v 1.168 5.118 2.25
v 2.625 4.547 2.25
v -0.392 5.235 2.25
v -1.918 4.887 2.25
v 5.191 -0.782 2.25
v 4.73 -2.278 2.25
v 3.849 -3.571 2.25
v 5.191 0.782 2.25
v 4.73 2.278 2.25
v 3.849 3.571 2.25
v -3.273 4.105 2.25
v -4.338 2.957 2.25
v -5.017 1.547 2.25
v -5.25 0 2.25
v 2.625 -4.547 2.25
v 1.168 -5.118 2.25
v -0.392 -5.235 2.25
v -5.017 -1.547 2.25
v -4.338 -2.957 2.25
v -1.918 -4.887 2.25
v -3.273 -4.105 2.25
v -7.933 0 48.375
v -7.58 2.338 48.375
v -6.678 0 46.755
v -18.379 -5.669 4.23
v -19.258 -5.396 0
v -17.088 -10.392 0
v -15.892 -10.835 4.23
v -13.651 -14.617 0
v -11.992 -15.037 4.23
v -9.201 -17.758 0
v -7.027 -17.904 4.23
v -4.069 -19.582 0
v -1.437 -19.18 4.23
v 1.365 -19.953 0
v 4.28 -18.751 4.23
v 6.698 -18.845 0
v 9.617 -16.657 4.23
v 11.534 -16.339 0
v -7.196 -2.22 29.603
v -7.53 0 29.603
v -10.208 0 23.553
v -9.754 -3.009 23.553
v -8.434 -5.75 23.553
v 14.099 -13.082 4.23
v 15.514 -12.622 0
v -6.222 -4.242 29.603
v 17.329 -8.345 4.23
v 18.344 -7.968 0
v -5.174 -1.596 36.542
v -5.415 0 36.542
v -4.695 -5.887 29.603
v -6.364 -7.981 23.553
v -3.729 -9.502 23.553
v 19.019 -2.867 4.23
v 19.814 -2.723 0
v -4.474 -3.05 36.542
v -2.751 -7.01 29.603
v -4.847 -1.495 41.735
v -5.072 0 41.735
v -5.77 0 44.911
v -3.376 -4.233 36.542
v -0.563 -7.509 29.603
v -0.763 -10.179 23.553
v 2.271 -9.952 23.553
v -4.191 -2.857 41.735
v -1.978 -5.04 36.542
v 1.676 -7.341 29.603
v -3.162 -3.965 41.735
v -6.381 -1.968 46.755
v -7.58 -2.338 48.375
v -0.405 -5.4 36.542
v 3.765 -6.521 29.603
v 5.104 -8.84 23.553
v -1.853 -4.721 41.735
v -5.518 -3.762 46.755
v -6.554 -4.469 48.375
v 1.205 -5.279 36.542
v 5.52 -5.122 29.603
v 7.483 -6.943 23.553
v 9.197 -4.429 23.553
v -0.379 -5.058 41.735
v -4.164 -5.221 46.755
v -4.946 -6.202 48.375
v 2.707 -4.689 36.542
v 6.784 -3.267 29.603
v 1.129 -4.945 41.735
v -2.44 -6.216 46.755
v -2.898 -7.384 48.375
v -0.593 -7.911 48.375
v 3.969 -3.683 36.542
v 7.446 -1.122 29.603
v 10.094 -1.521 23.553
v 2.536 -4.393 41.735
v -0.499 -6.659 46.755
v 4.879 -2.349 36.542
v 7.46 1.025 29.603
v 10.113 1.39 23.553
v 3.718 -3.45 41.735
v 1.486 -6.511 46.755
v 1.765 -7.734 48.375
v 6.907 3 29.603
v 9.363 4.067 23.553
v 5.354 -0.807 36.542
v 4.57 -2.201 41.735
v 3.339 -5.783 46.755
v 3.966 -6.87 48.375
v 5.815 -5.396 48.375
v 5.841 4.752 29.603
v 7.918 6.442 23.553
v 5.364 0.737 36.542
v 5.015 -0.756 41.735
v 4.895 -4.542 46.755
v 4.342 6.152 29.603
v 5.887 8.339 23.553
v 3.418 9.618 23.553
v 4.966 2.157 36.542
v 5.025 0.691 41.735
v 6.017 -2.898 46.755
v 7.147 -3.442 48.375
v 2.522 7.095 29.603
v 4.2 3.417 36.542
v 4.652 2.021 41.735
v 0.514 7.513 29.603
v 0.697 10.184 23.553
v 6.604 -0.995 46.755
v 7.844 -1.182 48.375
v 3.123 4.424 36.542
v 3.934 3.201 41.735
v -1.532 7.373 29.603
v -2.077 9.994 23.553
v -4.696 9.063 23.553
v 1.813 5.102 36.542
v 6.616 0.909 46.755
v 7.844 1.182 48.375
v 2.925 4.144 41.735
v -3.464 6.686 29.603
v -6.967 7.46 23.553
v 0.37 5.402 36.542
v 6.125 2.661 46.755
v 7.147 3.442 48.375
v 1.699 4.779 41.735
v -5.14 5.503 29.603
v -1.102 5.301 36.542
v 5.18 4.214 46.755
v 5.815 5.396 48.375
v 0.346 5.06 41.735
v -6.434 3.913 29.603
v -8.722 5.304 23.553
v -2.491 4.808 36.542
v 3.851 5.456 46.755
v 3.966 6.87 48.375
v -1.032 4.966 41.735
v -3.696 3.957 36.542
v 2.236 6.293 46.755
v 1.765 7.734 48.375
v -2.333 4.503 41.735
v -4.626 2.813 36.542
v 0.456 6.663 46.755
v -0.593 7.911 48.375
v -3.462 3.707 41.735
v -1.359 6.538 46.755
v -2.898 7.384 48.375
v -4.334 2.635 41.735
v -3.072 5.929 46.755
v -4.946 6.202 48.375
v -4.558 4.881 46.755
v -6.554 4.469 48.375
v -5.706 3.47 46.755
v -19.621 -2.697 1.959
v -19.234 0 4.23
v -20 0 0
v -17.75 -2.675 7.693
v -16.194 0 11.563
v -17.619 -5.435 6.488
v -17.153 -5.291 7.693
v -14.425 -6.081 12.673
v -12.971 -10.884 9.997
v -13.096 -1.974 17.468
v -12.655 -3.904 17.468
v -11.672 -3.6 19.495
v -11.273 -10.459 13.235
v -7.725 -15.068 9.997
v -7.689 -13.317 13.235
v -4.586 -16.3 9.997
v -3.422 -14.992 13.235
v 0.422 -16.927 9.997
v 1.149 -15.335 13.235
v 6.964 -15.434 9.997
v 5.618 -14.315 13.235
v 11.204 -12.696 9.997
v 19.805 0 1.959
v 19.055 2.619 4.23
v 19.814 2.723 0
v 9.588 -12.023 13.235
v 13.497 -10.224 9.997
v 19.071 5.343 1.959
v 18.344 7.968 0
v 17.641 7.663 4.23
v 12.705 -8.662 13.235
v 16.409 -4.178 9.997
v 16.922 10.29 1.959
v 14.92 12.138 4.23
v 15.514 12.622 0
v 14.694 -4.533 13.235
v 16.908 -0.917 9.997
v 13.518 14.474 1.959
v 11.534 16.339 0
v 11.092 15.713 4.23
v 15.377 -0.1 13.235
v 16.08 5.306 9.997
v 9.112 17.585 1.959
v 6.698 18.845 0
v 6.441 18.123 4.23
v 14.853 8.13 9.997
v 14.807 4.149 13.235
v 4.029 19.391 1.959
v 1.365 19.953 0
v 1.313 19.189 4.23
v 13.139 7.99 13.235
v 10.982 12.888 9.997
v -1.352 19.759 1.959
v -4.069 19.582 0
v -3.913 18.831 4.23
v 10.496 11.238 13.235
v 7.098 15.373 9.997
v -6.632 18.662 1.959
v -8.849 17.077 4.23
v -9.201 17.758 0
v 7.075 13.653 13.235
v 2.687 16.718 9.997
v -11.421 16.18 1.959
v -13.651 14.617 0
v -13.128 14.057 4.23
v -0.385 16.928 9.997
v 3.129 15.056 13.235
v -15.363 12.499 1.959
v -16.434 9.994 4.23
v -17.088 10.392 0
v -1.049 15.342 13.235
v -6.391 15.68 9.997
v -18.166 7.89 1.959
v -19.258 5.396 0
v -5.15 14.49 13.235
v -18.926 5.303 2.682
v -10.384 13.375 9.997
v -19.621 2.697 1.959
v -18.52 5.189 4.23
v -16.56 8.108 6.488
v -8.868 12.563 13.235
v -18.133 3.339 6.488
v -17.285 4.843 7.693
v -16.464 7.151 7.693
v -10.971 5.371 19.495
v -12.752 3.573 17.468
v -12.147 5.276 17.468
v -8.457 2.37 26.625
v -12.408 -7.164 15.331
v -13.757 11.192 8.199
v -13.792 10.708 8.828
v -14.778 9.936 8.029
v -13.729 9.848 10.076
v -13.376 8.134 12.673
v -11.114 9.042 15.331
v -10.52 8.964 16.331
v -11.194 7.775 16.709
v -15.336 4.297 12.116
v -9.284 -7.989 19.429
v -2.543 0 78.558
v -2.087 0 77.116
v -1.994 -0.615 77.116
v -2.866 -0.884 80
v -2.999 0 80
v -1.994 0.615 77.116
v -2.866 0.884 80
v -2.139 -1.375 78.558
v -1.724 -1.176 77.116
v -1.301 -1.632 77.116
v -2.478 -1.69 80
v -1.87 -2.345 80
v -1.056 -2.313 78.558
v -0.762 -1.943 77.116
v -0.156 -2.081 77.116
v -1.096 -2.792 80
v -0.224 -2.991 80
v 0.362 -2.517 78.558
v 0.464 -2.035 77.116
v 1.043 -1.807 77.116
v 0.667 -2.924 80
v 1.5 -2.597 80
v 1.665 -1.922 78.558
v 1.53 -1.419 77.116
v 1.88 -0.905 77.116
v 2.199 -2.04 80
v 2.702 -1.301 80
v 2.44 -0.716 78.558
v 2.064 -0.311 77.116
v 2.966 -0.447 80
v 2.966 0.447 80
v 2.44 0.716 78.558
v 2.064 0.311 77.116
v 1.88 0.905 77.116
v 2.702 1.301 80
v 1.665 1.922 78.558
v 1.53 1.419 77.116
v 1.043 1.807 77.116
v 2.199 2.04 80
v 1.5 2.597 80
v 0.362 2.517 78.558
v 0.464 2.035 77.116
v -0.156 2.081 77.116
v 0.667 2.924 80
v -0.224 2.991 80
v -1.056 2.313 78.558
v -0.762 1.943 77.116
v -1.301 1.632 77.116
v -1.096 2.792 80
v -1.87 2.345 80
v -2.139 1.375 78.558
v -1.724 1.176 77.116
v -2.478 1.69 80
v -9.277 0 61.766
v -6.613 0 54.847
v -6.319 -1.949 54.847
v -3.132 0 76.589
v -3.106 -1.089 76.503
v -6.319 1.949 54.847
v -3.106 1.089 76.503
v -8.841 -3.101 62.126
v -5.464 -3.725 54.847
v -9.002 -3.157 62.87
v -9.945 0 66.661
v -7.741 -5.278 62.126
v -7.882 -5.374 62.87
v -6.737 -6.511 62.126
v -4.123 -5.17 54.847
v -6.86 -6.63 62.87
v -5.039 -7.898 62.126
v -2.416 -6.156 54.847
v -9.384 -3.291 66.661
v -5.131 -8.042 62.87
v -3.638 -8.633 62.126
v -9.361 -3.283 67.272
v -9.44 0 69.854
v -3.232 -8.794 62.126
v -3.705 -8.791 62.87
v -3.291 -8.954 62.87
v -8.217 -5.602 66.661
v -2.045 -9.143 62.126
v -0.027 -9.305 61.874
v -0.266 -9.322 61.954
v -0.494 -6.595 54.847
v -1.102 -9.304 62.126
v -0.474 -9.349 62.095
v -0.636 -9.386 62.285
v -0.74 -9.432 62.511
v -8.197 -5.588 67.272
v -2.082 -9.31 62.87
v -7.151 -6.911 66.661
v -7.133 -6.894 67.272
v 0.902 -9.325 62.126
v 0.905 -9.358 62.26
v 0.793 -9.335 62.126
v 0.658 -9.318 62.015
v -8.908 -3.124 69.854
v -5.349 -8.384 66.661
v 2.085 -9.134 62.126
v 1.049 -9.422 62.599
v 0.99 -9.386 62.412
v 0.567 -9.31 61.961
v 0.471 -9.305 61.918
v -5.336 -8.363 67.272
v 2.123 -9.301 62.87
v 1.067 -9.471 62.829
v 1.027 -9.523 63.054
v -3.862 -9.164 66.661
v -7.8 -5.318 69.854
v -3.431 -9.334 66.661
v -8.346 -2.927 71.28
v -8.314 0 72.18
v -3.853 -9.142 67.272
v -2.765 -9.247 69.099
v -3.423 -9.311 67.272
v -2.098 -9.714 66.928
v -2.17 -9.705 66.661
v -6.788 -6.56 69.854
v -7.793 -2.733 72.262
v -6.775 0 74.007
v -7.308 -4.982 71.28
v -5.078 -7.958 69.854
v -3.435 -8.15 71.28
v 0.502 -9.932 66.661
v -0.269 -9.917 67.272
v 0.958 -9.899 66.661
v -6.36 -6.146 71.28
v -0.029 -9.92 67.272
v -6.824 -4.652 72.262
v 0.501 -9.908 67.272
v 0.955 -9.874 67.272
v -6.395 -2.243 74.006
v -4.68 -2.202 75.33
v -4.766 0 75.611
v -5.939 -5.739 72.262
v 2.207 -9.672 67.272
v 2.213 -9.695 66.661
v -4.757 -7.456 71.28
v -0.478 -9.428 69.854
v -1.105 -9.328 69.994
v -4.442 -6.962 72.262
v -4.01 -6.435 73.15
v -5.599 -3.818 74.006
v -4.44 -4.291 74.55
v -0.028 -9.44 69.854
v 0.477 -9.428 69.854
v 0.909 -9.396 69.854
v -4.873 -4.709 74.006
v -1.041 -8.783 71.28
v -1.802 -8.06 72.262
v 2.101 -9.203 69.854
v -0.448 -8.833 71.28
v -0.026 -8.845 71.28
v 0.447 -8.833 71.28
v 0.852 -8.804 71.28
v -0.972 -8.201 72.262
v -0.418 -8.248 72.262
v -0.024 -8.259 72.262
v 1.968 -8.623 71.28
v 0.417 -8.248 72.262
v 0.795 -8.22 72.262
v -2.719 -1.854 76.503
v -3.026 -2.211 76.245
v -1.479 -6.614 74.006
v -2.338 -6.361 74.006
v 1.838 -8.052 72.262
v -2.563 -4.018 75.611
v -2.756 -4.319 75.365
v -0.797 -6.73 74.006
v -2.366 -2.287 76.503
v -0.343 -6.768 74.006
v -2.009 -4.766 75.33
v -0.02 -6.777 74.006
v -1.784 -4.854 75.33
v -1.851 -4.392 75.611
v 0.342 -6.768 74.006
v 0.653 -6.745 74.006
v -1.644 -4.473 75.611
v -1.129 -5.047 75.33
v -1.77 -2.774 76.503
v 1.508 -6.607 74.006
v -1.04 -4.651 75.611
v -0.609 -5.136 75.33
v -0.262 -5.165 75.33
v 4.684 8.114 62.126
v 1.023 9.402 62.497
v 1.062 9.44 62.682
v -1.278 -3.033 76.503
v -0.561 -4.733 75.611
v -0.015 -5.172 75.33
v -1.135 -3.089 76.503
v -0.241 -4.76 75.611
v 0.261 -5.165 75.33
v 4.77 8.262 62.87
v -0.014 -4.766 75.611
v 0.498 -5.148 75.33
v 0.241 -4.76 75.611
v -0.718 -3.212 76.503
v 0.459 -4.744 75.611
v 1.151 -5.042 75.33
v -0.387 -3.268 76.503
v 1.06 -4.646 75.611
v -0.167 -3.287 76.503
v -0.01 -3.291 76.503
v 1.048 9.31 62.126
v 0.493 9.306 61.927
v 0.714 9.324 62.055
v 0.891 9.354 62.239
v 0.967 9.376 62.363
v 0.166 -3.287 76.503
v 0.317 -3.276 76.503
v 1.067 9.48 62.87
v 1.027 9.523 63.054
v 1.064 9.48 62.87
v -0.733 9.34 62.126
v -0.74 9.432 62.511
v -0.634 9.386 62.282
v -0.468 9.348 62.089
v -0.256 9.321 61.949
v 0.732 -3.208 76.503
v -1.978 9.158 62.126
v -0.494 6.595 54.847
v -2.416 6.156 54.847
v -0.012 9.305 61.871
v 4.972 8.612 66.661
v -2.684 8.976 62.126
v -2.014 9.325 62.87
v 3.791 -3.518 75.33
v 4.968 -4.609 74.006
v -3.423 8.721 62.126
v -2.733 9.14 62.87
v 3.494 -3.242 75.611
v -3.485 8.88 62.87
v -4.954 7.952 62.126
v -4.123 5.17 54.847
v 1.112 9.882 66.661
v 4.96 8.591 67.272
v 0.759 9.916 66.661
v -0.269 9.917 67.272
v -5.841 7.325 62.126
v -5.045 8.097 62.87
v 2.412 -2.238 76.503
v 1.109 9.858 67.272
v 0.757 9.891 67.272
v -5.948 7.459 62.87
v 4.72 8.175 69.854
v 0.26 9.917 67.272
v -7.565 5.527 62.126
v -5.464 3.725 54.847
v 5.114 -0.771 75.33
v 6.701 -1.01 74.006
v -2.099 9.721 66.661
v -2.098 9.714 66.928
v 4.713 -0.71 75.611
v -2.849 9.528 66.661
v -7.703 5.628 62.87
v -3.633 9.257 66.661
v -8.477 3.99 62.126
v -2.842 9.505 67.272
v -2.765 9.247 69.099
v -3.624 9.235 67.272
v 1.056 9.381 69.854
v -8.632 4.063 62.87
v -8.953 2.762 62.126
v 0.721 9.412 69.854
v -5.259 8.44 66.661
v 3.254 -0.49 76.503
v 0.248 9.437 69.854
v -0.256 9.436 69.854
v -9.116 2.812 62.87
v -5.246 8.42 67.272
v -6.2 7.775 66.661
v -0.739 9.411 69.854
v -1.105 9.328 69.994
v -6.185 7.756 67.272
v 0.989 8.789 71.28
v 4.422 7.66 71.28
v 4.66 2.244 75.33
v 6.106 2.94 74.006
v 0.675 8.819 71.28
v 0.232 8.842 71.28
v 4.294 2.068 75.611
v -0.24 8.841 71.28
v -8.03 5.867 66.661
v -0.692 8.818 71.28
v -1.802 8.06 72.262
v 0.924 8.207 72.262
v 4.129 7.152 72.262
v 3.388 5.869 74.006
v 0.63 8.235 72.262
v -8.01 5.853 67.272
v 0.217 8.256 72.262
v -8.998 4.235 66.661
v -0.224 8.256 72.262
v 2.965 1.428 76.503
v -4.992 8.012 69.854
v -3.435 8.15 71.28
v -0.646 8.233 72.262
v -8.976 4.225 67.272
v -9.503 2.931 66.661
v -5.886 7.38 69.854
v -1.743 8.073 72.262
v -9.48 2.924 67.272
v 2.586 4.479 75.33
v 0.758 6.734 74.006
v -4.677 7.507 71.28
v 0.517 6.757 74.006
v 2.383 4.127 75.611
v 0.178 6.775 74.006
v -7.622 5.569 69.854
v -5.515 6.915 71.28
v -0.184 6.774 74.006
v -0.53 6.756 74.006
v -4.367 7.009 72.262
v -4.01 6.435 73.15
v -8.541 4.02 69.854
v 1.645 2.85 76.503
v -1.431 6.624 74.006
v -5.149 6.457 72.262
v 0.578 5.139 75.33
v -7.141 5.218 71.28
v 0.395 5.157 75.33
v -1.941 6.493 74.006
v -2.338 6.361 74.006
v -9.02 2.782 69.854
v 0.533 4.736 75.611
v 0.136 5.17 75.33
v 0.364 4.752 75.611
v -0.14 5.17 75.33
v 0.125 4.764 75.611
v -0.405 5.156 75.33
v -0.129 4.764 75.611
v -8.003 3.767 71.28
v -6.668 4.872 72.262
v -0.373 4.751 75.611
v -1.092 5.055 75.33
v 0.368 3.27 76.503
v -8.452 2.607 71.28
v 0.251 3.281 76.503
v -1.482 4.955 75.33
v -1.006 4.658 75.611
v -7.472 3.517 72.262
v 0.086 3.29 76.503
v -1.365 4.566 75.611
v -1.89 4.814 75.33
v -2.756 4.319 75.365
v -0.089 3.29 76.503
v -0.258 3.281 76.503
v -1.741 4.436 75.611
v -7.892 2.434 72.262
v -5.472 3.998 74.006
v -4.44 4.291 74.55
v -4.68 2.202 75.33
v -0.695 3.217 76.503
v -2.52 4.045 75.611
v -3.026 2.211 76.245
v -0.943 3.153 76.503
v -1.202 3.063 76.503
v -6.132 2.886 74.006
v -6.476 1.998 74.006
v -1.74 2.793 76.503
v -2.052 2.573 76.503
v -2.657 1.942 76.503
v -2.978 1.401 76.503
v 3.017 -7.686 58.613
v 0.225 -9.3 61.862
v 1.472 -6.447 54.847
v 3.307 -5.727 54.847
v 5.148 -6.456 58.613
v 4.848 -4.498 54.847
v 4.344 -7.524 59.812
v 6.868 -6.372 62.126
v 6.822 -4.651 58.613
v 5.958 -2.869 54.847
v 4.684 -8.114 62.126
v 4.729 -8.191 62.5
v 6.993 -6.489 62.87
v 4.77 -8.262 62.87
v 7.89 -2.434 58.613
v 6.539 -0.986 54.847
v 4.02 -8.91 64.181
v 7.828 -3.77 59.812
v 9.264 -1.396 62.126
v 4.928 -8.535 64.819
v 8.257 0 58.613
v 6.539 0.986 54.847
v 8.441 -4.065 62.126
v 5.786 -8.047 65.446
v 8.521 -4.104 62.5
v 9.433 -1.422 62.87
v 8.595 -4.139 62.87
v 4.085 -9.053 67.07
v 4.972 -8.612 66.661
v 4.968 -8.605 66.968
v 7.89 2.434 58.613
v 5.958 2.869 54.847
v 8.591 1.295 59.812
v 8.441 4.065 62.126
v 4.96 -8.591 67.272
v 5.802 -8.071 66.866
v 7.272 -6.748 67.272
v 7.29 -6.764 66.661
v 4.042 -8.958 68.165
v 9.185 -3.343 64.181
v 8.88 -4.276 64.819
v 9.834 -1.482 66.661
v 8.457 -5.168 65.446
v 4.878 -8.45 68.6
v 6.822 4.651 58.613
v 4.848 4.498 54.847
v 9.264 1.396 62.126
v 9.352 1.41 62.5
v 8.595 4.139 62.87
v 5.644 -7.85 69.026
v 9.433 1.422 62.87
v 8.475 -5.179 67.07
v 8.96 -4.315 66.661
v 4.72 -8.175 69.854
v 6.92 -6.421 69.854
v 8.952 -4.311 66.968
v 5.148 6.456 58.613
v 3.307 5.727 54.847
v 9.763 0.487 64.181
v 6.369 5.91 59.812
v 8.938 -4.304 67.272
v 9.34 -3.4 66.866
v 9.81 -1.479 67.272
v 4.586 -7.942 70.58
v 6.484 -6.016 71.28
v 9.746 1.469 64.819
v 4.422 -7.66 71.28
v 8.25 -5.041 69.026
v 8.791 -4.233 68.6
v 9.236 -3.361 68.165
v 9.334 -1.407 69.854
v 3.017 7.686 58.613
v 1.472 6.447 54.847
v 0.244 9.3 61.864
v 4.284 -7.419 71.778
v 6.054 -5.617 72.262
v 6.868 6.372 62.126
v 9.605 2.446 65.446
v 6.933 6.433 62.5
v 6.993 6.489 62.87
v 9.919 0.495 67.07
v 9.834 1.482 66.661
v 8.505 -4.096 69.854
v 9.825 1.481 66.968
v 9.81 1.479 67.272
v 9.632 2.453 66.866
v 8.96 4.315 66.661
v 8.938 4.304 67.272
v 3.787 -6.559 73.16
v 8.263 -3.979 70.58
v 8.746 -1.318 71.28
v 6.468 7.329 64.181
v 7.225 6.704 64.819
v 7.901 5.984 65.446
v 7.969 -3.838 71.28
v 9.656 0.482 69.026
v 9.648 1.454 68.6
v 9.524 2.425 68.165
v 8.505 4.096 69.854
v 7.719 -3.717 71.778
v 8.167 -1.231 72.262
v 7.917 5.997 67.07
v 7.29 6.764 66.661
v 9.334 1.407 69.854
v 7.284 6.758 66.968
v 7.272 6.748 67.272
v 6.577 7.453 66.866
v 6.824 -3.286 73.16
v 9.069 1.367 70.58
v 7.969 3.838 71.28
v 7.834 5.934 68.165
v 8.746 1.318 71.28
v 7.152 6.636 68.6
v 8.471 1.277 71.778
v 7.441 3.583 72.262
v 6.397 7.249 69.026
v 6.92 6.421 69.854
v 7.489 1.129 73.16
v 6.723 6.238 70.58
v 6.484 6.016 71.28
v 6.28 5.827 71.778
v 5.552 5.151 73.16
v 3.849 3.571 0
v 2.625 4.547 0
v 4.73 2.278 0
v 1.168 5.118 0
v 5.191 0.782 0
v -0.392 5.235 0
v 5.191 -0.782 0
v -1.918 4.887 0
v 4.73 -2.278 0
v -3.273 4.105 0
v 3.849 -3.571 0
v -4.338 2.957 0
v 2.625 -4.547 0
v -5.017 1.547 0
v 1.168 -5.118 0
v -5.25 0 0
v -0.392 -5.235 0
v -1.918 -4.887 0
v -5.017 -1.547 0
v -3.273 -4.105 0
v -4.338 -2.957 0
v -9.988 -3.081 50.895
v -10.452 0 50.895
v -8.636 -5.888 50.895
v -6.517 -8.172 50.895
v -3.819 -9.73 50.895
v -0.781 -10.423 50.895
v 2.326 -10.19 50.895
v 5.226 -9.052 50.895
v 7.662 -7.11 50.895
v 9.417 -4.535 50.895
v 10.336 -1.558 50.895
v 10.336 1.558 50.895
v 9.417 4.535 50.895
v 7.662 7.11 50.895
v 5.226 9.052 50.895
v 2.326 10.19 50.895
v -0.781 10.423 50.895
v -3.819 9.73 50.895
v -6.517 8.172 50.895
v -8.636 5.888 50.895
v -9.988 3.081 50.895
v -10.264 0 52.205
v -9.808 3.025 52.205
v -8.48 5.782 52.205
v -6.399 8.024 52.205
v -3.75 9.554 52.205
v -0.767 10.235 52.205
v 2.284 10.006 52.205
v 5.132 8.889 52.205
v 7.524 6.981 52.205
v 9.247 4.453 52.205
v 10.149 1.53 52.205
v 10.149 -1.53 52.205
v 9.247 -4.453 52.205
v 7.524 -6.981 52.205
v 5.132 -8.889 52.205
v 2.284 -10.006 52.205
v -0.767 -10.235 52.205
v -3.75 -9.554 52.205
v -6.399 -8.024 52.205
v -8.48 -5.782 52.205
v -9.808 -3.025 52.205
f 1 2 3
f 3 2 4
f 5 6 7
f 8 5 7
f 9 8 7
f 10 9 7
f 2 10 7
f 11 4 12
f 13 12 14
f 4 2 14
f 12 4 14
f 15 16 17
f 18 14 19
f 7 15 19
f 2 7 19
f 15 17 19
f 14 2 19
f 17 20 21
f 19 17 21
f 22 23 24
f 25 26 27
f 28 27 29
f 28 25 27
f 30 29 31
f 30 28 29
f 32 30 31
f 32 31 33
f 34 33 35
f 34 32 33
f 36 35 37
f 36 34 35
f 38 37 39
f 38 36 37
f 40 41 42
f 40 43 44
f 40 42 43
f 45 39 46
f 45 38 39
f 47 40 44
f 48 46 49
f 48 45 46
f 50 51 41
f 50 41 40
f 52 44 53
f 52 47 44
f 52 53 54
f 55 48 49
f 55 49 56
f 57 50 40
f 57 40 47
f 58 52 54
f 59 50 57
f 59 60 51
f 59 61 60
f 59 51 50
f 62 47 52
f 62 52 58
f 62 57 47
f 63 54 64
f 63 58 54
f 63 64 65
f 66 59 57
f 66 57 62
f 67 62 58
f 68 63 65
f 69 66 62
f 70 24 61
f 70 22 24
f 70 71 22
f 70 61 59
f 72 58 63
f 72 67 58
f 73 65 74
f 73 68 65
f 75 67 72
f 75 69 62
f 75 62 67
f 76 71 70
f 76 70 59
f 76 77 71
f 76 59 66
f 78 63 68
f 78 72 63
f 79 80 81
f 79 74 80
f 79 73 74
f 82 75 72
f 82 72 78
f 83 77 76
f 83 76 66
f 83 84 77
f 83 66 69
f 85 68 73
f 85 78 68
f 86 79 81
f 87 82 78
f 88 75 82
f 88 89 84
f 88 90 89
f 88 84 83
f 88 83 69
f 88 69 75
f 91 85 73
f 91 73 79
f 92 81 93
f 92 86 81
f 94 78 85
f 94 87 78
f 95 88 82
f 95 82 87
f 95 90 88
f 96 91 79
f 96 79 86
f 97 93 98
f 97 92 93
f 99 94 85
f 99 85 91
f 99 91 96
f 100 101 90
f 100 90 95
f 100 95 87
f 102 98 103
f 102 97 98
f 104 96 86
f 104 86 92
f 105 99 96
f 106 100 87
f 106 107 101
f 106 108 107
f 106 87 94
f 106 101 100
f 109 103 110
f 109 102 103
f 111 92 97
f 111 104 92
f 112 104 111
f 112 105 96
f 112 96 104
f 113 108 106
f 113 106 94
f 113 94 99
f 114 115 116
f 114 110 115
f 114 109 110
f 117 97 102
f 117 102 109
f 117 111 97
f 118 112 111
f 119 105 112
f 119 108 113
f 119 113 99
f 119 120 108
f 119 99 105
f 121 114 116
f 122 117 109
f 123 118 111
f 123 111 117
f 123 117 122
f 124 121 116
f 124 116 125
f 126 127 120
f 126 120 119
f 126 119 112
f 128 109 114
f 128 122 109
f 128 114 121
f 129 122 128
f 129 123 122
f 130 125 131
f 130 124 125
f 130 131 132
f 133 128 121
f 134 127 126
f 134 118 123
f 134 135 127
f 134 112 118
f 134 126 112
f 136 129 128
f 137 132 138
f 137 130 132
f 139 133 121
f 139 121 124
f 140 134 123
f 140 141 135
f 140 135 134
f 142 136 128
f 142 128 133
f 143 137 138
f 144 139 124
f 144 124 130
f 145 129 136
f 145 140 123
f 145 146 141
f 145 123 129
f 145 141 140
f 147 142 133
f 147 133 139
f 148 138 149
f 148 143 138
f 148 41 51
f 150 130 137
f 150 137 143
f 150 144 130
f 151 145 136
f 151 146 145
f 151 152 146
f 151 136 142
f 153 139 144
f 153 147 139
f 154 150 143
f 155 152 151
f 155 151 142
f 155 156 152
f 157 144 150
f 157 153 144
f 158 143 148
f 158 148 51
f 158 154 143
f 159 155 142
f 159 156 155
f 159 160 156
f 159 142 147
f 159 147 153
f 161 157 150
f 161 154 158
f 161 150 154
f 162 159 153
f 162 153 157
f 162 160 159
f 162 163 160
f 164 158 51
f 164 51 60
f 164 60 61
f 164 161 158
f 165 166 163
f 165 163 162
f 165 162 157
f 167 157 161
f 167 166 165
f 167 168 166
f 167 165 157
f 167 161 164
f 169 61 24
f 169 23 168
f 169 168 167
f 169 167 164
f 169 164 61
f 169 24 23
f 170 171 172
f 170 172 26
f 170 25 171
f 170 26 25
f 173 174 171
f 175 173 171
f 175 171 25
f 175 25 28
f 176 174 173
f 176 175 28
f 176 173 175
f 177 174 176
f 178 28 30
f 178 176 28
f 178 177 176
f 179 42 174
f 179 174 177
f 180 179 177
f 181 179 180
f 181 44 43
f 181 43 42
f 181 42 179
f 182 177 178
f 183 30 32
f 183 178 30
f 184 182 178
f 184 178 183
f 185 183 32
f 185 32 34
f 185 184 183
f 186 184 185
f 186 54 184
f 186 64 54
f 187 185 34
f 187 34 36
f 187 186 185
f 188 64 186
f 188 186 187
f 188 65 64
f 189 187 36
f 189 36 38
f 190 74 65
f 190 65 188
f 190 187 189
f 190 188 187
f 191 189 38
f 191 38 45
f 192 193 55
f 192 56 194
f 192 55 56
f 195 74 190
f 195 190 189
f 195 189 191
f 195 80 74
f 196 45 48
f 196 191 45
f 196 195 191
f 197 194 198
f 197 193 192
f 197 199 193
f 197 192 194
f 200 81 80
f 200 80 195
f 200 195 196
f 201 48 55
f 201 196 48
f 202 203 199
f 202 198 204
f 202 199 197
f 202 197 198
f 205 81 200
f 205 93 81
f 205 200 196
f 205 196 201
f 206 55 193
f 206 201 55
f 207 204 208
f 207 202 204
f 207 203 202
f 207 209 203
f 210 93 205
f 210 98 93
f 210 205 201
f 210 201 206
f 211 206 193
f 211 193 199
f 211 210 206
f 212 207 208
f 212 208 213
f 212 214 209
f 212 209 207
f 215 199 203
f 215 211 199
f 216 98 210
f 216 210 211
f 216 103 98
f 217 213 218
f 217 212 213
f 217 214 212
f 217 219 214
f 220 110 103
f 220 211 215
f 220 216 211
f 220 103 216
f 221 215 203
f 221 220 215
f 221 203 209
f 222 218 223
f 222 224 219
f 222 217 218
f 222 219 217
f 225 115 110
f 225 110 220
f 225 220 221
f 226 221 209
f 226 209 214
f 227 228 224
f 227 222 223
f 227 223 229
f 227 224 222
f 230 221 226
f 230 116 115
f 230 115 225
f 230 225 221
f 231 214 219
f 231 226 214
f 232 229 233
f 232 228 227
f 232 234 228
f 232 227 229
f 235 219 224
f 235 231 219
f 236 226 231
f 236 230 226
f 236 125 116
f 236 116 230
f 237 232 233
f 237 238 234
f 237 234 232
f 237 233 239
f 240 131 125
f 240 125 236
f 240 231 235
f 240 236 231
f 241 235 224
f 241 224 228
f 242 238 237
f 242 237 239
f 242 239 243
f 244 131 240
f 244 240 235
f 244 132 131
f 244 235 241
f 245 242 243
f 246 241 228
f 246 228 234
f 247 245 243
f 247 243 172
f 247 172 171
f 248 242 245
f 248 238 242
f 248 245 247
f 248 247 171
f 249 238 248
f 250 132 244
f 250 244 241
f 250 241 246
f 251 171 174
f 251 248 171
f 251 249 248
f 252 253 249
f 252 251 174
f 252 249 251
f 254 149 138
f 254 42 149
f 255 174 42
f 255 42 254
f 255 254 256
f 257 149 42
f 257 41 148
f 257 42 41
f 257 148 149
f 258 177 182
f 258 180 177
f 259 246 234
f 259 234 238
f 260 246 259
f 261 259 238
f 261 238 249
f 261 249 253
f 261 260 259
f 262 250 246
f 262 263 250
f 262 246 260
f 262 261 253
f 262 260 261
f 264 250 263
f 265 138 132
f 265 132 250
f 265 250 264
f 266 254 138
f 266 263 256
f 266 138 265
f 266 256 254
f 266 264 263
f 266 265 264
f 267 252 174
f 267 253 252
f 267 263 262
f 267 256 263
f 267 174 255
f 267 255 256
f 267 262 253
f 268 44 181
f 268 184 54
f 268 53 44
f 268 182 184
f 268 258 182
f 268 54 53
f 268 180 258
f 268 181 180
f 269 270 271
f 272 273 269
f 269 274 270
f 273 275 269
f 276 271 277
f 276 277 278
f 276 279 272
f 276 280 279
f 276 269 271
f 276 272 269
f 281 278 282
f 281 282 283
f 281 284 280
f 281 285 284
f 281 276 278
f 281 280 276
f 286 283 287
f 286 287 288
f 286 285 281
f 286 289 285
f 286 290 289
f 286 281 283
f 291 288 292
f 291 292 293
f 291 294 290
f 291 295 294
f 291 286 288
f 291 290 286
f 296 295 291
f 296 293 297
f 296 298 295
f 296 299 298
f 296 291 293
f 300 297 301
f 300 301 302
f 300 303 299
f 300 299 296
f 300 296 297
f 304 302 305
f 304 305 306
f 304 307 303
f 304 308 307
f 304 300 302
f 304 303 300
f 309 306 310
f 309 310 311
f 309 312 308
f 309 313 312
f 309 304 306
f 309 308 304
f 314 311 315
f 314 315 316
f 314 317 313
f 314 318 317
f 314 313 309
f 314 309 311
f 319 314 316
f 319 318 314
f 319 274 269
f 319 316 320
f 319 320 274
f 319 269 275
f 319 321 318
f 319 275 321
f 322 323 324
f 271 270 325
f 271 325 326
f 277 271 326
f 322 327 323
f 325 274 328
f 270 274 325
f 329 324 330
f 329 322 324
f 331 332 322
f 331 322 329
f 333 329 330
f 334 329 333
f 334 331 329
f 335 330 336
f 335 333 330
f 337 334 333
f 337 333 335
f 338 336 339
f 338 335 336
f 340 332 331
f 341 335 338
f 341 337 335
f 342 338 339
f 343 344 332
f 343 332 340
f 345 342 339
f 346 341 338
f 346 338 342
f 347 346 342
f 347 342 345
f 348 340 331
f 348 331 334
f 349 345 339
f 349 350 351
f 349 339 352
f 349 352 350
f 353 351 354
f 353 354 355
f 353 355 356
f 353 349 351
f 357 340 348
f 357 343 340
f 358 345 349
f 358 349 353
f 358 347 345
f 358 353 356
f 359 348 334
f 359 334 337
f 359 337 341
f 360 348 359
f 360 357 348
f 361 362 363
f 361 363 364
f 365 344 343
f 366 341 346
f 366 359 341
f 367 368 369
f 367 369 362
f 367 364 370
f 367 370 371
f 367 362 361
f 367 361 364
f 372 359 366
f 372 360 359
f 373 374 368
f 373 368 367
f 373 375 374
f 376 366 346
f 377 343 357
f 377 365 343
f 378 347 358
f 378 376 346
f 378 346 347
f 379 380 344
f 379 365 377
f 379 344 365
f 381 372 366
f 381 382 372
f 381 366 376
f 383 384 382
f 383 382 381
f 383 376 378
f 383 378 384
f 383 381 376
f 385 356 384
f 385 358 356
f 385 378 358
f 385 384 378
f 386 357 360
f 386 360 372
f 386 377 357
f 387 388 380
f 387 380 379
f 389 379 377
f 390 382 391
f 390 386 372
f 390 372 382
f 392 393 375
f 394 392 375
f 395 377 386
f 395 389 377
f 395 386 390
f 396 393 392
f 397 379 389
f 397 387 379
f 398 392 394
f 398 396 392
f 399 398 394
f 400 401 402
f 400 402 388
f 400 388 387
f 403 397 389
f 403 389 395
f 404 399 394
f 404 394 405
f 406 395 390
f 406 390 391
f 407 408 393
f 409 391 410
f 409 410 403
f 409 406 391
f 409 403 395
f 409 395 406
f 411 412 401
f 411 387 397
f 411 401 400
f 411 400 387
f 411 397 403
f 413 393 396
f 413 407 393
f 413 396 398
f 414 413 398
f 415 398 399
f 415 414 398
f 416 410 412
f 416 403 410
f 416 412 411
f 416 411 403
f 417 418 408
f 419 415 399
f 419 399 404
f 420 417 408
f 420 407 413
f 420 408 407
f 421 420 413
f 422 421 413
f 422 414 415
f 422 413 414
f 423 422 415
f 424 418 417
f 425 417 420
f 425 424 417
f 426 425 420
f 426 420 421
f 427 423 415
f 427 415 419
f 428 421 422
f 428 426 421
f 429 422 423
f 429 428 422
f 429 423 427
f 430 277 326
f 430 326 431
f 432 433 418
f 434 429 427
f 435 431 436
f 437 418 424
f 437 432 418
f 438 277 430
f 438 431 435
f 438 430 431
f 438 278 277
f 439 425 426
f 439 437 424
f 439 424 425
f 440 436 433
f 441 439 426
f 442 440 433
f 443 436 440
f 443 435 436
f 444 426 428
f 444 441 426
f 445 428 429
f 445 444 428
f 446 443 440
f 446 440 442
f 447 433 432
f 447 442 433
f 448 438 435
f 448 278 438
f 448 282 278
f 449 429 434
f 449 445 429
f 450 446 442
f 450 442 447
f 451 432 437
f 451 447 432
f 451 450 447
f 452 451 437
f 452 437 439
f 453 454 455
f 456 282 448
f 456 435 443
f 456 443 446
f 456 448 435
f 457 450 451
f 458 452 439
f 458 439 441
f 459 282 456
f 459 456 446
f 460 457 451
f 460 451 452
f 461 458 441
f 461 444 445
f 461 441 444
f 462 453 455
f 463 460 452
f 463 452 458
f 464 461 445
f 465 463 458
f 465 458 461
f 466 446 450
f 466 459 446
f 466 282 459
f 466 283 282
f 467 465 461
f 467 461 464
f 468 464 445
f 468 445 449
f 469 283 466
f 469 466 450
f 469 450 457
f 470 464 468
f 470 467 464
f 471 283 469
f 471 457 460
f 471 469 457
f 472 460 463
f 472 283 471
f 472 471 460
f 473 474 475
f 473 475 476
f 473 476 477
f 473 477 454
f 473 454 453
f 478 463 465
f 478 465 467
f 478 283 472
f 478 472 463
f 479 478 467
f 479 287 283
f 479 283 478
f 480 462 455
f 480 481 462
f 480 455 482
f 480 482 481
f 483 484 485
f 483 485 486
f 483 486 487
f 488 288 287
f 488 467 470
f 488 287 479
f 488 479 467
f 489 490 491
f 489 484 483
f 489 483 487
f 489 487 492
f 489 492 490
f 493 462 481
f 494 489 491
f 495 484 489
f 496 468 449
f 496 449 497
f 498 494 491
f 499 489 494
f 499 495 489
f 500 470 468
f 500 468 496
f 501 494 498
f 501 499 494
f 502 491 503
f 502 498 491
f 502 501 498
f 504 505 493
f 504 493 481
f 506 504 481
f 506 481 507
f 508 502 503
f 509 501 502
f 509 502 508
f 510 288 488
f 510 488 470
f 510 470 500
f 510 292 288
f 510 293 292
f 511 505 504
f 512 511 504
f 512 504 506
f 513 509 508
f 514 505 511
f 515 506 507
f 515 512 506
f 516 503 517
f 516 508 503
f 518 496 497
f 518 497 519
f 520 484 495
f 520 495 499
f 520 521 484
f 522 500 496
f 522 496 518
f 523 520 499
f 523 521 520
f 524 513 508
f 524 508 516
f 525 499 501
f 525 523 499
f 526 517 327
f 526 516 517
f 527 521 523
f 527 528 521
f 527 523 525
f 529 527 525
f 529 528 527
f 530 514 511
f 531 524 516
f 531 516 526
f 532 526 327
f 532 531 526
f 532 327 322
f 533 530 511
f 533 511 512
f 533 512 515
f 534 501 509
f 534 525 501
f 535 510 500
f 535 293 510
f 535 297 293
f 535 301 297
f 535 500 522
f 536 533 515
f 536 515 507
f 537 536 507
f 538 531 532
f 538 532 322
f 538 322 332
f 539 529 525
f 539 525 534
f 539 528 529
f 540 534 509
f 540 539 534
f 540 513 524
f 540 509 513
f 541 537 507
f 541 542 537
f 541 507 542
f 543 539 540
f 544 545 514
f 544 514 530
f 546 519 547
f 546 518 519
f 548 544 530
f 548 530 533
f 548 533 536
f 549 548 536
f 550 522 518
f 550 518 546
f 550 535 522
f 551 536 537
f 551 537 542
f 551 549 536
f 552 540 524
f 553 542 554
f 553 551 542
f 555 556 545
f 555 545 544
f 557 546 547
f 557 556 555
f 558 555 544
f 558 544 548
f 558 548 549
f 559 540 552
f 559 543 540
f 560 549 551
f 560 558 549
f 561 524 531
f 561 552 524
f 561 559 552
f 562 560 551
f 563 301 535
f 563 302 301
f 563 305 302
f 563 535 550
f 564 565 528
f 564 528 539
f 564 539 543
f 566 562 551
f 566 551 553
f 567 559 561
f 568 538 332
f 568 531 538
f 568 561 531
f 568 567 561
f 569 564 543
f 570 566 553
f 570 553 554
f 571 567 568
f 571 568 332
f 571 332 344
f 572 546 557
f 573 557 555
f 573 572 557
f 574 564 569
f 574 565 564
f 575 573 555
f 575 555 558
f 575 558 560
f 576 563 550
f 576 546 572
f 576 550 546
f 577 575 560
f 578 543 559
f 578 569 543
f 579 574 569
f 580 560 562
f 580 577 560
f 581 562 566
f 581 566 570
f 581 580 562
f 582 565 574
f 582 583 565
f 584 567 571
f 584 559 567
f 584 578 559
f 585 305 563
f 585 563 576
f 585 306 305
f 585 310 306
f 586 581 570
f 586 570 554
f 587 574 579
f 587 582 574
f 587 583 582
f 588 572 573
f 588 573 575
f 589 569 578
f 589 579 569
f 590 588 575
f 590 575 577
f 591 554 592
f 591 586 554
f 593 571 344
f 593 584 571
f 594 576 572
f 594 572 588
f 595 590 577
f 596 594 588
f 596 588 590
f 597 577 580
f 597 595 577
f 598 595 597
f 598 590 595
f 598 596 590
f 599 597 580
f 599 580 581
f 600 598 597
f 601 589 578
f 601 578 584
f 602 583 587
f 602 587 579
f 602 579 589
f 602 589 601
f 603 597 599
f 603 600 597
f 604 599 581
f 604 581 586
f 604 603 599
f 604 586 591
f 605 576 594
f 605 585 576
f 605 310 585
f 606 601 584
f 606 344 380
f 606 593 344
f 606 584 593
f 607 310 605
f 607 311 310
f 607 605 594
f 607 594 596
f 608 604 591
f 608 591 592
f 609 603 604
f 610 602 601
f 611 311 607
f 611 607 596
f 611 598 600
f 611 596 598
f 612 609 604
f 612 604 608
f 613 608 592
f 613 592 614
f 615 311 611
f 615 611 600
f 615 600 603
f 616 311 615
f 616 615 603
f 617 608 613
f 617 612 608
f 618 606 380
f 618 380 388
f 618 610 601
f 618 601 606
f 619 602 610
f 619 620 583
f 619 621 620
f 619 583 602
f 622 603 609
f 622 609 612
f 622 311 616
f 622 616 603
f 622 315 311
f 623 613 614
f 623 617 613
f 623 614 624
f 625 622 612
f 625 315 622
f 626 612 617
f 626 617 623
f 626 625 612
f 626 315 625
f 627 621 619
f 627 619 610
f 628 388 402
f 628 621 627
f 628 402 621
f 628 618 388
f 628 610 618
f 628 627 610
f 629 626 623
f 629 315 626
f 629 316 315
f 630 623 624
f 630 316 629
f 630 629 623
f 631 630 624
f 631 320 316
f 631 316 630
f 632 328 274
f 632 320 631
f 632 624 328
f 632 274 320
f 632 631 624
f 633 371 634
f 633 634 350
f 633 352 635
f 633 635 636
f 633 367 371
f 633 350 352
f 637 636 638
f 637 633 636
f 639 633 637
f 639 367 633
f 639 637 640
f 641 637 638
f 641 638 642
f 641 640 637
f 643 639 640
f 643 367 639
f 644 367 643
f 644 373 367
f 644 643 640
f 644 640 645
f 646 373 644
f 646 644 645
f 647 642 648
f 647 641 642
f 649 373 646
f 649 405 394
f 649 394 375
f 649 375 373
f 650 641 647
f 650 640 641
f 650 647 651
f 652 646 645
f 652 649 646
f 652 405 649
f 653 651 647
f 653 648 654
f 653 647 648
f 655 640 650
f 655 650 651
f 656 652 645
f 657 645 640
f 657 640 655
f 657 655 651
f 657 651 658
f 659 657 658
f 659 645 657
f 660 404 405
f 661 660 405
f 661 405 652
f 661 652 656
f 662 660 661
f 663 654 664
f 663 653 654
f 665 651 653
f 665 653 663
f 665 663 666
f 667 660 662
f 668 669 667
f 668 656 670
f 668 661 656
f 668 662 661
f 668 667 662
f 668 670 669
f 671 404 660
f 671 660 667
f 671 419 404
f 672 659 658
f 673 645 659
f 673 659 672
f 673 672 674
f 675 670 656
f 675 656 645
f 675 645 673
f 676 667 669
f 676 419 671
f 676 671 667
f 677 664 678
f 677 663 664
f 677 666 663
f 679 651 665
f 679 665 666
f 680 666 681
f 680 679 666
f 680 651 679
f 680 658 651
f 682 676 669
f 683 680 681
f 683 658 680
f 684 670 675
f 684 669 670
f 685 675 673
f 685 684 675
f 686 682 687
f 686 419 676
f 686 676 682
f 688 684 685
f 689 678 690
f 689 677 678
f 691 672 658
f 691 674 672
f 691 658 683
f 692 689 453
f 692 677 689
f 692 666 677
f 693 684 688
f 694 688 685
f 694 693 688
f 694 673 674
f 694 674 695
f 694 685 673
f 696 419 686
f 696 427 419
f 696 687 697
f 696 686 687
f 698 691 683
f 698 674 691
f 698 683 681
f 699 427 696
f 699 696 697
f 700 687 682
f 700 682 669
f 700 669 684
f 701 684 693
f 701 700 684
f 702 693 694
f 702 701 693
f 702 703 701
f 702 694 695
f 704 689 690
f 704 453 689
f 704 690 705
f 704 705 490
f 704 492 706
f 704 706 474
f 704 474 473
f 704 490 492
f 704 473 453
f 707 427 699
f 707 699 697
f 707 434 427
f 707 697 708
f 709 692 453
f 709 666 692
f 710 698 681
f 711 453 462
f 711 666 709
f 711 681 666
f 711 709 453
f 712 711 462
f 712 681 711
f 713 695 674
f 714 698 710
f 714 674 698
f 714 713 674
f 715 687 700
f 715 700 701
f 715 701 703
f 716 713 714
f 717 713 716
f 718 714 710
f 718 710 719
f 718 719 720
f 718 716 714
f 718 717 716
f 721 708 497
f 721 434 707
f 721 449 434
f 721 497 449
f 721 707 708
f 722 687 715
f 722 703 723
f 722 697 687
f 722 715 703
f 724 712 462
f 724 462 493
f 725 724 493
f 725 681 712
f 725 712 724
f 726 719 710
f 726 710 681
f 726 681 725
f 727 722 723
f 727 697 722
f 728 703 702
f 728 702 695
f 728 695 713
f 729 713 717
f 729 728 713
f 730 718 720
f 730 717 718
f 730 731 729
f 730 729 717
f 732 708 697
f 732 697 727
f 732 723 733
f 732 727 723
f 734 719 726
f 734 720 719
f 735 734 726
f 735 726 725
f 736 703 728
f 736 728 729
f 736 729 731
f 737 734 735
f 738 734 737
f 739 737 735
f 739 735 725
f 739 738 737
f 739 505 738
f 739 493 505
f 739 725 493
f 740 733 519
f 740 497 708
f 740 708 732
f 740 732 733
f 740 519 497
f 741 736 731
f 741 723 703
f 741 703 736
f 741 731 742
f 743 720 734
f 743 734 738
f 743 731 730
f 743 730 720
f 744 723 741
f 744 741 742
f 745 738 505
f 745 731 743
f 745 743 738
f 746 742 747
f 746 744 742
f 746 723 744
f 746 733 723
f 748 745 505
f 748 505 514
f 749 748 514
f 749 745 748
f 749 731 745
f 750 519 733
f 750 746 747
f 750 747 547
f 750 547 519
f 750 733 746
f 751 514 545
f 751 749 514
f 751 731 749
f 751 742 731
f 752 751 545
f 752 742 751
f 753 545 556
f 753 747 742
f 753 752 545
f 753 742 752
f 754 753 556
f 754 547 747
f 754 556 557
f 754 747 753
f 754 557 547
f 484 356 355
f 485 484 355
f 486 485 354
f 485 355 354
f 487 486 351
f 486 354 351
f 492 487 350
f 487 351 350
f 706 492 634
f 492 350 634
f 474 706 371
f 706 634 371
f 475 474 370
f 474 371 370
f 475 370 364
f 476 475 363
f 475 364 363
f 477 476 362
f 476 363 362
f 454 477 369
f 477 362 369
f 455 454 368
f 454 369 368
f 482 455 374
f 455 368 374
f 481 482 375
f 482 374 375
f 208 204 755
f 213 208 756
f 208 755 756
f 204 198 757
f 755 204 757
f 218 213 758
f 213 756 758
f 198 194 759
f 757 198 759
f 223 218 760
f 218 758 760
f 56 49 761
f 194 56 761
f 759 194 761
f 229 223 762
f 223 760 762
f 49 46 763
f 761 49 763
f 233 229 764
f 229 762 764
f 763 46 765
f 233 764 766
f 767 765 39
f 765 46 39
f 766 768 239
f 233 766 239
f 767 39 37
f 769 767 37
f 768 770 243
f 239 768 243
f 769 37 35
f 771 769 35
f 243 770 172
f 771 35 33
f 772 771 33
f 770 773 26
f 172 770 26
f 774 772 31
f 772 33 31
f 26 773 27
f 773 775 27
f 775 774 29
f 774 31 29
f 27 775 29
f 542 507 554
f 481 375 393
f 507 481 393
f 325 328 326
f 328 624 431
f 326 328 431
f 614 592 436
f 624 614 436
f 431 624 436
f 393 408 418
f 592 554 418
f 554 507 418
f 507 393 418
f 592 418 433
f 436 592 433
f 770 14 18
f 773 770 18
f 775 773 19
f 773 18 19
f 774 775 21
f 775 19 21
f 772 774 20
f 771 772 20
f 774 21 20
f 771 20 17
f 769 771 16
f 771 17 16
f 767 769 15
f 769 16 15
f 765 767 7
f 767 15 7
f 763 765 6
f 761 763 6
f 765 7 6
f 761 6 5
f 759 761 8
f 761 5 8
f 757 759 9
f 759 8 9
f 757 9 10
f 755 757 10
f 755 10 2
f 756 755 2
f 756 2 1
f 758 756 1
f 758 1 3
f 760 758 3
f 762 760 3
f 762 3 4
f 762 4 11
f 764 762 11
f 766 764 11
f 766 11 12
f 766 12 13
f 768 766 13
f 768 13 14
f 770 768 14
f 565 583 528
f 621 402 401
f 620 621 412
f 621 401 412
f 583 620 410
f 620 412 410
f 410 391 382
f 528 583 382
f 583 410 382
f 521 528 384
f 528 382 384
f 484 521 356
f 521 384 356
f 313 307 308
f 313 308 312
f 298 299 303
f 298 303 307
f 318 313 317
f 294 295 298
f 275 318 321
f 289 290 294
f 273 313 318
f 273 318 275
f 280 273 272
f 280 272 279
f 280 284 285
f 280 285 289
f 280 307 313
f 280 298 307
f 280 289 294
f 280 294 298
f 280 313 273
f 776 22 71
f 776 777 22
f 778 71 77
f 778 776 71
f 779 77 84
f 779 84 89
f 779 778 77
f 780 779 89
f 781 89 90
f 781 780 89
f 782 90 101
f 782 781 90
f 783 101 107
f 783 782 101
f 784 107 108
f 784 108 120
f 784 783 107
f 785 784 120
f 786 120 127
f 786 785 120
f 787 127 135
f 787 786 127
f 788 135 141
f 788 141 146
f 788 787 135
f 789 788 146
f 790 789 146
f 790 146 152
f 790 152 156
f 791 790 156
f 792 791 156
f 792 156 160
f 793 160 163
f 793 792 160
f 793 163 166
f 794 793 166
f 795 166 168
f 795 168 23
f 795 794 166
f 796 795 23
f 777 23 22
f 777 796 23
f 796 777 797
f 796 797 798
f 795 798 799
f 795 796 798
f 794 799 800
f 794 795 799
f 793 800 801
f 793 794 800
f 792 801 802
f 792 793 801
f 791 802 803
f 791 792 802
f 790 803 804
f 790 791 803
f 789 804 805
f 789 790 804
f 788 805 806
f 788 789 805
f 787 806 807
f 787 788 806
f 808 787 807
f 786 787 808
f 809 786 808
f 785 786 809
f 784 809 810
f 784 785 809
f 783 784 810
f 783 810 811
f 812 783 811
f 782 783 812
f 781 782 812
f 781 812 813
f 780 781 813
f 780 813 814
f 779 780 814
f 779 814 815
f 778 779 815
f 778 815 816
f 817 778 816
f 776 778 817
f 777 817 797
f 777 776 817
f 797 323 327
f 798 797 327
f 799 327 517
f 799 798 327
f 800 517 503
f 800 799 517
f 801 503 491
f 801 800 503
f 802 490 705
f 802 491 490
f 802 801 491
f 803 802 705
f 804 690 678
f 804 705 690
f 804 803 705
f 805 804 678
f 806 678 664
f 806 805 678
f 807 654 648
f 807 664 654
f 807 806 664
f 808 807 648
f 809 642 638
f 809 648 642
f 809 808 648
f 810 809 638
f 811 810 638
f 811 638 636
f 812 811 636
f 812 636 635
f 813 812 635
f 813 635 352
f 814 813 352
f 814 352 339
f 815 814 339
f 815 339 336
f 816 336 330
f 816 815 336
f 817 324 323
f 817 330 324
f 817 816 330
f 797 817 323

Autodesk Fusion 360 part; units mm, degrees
sketch "Sketch1" plane through (0, 0, 0) normal (0, 1, 0) x (1, 0, 0)
  line L0 (0, 0) -> (0, -80)
  line L1 (0, 0) -> (-20, 0)
  line L2 (-6.0501, -55.2545) -> (-10.2637, -52.2049)
  line L3 (-10.4525, -50.8951) -> (-5.4129, -45.8555)
  line L4 (-10.2637, -52.2049) -> (-10.4525, -50.8951)
  line L5 (0, -70.5202) -> (-2.9993, -80)
  line L6 (-2.9993, -80) -> (0, -80)
  spline S0 degree 5 poles (-20, 0) (-20, -0.6734) (-19.8627, -2.1332) (-19.2448, -4.6616) (-17.6673, -8.6584) (-14.8349, -14.4044) (-11.653, -20.5245) (-8.6578, -26.6258) (-6.3321, -32.3545) (-5.0054, -37.4666) (-4.7896, -41.8717) (-5.5103, -44.8202) (-6.5359, -46.7178) (-7.4317, -47.8457) (-7.9327, -48.3753) knots 0 0 0 0 0 0 0.1 0.2 0.3 0.4 0.5 0.6 0.7 0.8 0.9 1 1 1 1 1 1
  spline S1 degree 5 poles (-6.6133, -54.8469) (-6.9485, -55.5323) (-7.579, -56.8841) (-8.4052, -58.855) (-9.2635, -61.3672) (-9.9029, -64.3011) (-10.0667, -67.0089) (-9.7113, -69.4697) (-8.8041, -71.6681) (-7.3543, -73.6084) (-5.3976, -75.3076) (-3.4574, -76.4886) (-1.8044, -77.2803) (-0.6159, -77.767) (0, -78) knots 0 0 0 0 0 0 0.1 0.2 0.3 0.4 0.5 0.6 0.7 0.8 0.9 1 1 1 1 1 1
  line L7 (-20, 3) -> (-20, -3)
  line L8 (-5.25, 0) -> (-5.25, -2.25)
  line L9 (-5.25, -2.25) -> (0, -2.25)
  point P0 (-7, -31)
  point P1 (-9.3943, -69.9909)
  dimension "d2" = 20
  dimension "d5" = 80
  dimension "d7" = 45
  dimension "d8" = 2.25
  dimension "d9" = 5.25
revolve "Revolve1" add sketch "Sketch1" angle 360 about axis through (0, 0, 0) along (0, 0, 1) contours L0 L1 L2 L3 L4 L5 S0 S1 L8 L9 | L0 L5 S1 | L0 L5 L6 S1
sketch "Sketch2" plane through (0, 0, 0) normal (0, 1, 0) x (1, 0, 0)
  line L0 (-5.5, -78) -> (-0.7405, -62.5113)
  line L1 (-0.7405, -62.5113) -> (1.027, -63.0544)
  line L2 (1.027, -63.0544) -> (-3.8706, -78.9928)
  arc A0 (1.027, -63.0544) -> (-0.7405, -62.5113) centre (0.1432, -62.7828) ccw
  line L3 (-5.5, -78) -> (-3.8706, -78.9928)
extrude "Extrude1" cut sketch "Sketch2" along normal through all and the other way through all
equation "d1 = 8 cm"
equation "d2 = d1 * 1 / 4"
